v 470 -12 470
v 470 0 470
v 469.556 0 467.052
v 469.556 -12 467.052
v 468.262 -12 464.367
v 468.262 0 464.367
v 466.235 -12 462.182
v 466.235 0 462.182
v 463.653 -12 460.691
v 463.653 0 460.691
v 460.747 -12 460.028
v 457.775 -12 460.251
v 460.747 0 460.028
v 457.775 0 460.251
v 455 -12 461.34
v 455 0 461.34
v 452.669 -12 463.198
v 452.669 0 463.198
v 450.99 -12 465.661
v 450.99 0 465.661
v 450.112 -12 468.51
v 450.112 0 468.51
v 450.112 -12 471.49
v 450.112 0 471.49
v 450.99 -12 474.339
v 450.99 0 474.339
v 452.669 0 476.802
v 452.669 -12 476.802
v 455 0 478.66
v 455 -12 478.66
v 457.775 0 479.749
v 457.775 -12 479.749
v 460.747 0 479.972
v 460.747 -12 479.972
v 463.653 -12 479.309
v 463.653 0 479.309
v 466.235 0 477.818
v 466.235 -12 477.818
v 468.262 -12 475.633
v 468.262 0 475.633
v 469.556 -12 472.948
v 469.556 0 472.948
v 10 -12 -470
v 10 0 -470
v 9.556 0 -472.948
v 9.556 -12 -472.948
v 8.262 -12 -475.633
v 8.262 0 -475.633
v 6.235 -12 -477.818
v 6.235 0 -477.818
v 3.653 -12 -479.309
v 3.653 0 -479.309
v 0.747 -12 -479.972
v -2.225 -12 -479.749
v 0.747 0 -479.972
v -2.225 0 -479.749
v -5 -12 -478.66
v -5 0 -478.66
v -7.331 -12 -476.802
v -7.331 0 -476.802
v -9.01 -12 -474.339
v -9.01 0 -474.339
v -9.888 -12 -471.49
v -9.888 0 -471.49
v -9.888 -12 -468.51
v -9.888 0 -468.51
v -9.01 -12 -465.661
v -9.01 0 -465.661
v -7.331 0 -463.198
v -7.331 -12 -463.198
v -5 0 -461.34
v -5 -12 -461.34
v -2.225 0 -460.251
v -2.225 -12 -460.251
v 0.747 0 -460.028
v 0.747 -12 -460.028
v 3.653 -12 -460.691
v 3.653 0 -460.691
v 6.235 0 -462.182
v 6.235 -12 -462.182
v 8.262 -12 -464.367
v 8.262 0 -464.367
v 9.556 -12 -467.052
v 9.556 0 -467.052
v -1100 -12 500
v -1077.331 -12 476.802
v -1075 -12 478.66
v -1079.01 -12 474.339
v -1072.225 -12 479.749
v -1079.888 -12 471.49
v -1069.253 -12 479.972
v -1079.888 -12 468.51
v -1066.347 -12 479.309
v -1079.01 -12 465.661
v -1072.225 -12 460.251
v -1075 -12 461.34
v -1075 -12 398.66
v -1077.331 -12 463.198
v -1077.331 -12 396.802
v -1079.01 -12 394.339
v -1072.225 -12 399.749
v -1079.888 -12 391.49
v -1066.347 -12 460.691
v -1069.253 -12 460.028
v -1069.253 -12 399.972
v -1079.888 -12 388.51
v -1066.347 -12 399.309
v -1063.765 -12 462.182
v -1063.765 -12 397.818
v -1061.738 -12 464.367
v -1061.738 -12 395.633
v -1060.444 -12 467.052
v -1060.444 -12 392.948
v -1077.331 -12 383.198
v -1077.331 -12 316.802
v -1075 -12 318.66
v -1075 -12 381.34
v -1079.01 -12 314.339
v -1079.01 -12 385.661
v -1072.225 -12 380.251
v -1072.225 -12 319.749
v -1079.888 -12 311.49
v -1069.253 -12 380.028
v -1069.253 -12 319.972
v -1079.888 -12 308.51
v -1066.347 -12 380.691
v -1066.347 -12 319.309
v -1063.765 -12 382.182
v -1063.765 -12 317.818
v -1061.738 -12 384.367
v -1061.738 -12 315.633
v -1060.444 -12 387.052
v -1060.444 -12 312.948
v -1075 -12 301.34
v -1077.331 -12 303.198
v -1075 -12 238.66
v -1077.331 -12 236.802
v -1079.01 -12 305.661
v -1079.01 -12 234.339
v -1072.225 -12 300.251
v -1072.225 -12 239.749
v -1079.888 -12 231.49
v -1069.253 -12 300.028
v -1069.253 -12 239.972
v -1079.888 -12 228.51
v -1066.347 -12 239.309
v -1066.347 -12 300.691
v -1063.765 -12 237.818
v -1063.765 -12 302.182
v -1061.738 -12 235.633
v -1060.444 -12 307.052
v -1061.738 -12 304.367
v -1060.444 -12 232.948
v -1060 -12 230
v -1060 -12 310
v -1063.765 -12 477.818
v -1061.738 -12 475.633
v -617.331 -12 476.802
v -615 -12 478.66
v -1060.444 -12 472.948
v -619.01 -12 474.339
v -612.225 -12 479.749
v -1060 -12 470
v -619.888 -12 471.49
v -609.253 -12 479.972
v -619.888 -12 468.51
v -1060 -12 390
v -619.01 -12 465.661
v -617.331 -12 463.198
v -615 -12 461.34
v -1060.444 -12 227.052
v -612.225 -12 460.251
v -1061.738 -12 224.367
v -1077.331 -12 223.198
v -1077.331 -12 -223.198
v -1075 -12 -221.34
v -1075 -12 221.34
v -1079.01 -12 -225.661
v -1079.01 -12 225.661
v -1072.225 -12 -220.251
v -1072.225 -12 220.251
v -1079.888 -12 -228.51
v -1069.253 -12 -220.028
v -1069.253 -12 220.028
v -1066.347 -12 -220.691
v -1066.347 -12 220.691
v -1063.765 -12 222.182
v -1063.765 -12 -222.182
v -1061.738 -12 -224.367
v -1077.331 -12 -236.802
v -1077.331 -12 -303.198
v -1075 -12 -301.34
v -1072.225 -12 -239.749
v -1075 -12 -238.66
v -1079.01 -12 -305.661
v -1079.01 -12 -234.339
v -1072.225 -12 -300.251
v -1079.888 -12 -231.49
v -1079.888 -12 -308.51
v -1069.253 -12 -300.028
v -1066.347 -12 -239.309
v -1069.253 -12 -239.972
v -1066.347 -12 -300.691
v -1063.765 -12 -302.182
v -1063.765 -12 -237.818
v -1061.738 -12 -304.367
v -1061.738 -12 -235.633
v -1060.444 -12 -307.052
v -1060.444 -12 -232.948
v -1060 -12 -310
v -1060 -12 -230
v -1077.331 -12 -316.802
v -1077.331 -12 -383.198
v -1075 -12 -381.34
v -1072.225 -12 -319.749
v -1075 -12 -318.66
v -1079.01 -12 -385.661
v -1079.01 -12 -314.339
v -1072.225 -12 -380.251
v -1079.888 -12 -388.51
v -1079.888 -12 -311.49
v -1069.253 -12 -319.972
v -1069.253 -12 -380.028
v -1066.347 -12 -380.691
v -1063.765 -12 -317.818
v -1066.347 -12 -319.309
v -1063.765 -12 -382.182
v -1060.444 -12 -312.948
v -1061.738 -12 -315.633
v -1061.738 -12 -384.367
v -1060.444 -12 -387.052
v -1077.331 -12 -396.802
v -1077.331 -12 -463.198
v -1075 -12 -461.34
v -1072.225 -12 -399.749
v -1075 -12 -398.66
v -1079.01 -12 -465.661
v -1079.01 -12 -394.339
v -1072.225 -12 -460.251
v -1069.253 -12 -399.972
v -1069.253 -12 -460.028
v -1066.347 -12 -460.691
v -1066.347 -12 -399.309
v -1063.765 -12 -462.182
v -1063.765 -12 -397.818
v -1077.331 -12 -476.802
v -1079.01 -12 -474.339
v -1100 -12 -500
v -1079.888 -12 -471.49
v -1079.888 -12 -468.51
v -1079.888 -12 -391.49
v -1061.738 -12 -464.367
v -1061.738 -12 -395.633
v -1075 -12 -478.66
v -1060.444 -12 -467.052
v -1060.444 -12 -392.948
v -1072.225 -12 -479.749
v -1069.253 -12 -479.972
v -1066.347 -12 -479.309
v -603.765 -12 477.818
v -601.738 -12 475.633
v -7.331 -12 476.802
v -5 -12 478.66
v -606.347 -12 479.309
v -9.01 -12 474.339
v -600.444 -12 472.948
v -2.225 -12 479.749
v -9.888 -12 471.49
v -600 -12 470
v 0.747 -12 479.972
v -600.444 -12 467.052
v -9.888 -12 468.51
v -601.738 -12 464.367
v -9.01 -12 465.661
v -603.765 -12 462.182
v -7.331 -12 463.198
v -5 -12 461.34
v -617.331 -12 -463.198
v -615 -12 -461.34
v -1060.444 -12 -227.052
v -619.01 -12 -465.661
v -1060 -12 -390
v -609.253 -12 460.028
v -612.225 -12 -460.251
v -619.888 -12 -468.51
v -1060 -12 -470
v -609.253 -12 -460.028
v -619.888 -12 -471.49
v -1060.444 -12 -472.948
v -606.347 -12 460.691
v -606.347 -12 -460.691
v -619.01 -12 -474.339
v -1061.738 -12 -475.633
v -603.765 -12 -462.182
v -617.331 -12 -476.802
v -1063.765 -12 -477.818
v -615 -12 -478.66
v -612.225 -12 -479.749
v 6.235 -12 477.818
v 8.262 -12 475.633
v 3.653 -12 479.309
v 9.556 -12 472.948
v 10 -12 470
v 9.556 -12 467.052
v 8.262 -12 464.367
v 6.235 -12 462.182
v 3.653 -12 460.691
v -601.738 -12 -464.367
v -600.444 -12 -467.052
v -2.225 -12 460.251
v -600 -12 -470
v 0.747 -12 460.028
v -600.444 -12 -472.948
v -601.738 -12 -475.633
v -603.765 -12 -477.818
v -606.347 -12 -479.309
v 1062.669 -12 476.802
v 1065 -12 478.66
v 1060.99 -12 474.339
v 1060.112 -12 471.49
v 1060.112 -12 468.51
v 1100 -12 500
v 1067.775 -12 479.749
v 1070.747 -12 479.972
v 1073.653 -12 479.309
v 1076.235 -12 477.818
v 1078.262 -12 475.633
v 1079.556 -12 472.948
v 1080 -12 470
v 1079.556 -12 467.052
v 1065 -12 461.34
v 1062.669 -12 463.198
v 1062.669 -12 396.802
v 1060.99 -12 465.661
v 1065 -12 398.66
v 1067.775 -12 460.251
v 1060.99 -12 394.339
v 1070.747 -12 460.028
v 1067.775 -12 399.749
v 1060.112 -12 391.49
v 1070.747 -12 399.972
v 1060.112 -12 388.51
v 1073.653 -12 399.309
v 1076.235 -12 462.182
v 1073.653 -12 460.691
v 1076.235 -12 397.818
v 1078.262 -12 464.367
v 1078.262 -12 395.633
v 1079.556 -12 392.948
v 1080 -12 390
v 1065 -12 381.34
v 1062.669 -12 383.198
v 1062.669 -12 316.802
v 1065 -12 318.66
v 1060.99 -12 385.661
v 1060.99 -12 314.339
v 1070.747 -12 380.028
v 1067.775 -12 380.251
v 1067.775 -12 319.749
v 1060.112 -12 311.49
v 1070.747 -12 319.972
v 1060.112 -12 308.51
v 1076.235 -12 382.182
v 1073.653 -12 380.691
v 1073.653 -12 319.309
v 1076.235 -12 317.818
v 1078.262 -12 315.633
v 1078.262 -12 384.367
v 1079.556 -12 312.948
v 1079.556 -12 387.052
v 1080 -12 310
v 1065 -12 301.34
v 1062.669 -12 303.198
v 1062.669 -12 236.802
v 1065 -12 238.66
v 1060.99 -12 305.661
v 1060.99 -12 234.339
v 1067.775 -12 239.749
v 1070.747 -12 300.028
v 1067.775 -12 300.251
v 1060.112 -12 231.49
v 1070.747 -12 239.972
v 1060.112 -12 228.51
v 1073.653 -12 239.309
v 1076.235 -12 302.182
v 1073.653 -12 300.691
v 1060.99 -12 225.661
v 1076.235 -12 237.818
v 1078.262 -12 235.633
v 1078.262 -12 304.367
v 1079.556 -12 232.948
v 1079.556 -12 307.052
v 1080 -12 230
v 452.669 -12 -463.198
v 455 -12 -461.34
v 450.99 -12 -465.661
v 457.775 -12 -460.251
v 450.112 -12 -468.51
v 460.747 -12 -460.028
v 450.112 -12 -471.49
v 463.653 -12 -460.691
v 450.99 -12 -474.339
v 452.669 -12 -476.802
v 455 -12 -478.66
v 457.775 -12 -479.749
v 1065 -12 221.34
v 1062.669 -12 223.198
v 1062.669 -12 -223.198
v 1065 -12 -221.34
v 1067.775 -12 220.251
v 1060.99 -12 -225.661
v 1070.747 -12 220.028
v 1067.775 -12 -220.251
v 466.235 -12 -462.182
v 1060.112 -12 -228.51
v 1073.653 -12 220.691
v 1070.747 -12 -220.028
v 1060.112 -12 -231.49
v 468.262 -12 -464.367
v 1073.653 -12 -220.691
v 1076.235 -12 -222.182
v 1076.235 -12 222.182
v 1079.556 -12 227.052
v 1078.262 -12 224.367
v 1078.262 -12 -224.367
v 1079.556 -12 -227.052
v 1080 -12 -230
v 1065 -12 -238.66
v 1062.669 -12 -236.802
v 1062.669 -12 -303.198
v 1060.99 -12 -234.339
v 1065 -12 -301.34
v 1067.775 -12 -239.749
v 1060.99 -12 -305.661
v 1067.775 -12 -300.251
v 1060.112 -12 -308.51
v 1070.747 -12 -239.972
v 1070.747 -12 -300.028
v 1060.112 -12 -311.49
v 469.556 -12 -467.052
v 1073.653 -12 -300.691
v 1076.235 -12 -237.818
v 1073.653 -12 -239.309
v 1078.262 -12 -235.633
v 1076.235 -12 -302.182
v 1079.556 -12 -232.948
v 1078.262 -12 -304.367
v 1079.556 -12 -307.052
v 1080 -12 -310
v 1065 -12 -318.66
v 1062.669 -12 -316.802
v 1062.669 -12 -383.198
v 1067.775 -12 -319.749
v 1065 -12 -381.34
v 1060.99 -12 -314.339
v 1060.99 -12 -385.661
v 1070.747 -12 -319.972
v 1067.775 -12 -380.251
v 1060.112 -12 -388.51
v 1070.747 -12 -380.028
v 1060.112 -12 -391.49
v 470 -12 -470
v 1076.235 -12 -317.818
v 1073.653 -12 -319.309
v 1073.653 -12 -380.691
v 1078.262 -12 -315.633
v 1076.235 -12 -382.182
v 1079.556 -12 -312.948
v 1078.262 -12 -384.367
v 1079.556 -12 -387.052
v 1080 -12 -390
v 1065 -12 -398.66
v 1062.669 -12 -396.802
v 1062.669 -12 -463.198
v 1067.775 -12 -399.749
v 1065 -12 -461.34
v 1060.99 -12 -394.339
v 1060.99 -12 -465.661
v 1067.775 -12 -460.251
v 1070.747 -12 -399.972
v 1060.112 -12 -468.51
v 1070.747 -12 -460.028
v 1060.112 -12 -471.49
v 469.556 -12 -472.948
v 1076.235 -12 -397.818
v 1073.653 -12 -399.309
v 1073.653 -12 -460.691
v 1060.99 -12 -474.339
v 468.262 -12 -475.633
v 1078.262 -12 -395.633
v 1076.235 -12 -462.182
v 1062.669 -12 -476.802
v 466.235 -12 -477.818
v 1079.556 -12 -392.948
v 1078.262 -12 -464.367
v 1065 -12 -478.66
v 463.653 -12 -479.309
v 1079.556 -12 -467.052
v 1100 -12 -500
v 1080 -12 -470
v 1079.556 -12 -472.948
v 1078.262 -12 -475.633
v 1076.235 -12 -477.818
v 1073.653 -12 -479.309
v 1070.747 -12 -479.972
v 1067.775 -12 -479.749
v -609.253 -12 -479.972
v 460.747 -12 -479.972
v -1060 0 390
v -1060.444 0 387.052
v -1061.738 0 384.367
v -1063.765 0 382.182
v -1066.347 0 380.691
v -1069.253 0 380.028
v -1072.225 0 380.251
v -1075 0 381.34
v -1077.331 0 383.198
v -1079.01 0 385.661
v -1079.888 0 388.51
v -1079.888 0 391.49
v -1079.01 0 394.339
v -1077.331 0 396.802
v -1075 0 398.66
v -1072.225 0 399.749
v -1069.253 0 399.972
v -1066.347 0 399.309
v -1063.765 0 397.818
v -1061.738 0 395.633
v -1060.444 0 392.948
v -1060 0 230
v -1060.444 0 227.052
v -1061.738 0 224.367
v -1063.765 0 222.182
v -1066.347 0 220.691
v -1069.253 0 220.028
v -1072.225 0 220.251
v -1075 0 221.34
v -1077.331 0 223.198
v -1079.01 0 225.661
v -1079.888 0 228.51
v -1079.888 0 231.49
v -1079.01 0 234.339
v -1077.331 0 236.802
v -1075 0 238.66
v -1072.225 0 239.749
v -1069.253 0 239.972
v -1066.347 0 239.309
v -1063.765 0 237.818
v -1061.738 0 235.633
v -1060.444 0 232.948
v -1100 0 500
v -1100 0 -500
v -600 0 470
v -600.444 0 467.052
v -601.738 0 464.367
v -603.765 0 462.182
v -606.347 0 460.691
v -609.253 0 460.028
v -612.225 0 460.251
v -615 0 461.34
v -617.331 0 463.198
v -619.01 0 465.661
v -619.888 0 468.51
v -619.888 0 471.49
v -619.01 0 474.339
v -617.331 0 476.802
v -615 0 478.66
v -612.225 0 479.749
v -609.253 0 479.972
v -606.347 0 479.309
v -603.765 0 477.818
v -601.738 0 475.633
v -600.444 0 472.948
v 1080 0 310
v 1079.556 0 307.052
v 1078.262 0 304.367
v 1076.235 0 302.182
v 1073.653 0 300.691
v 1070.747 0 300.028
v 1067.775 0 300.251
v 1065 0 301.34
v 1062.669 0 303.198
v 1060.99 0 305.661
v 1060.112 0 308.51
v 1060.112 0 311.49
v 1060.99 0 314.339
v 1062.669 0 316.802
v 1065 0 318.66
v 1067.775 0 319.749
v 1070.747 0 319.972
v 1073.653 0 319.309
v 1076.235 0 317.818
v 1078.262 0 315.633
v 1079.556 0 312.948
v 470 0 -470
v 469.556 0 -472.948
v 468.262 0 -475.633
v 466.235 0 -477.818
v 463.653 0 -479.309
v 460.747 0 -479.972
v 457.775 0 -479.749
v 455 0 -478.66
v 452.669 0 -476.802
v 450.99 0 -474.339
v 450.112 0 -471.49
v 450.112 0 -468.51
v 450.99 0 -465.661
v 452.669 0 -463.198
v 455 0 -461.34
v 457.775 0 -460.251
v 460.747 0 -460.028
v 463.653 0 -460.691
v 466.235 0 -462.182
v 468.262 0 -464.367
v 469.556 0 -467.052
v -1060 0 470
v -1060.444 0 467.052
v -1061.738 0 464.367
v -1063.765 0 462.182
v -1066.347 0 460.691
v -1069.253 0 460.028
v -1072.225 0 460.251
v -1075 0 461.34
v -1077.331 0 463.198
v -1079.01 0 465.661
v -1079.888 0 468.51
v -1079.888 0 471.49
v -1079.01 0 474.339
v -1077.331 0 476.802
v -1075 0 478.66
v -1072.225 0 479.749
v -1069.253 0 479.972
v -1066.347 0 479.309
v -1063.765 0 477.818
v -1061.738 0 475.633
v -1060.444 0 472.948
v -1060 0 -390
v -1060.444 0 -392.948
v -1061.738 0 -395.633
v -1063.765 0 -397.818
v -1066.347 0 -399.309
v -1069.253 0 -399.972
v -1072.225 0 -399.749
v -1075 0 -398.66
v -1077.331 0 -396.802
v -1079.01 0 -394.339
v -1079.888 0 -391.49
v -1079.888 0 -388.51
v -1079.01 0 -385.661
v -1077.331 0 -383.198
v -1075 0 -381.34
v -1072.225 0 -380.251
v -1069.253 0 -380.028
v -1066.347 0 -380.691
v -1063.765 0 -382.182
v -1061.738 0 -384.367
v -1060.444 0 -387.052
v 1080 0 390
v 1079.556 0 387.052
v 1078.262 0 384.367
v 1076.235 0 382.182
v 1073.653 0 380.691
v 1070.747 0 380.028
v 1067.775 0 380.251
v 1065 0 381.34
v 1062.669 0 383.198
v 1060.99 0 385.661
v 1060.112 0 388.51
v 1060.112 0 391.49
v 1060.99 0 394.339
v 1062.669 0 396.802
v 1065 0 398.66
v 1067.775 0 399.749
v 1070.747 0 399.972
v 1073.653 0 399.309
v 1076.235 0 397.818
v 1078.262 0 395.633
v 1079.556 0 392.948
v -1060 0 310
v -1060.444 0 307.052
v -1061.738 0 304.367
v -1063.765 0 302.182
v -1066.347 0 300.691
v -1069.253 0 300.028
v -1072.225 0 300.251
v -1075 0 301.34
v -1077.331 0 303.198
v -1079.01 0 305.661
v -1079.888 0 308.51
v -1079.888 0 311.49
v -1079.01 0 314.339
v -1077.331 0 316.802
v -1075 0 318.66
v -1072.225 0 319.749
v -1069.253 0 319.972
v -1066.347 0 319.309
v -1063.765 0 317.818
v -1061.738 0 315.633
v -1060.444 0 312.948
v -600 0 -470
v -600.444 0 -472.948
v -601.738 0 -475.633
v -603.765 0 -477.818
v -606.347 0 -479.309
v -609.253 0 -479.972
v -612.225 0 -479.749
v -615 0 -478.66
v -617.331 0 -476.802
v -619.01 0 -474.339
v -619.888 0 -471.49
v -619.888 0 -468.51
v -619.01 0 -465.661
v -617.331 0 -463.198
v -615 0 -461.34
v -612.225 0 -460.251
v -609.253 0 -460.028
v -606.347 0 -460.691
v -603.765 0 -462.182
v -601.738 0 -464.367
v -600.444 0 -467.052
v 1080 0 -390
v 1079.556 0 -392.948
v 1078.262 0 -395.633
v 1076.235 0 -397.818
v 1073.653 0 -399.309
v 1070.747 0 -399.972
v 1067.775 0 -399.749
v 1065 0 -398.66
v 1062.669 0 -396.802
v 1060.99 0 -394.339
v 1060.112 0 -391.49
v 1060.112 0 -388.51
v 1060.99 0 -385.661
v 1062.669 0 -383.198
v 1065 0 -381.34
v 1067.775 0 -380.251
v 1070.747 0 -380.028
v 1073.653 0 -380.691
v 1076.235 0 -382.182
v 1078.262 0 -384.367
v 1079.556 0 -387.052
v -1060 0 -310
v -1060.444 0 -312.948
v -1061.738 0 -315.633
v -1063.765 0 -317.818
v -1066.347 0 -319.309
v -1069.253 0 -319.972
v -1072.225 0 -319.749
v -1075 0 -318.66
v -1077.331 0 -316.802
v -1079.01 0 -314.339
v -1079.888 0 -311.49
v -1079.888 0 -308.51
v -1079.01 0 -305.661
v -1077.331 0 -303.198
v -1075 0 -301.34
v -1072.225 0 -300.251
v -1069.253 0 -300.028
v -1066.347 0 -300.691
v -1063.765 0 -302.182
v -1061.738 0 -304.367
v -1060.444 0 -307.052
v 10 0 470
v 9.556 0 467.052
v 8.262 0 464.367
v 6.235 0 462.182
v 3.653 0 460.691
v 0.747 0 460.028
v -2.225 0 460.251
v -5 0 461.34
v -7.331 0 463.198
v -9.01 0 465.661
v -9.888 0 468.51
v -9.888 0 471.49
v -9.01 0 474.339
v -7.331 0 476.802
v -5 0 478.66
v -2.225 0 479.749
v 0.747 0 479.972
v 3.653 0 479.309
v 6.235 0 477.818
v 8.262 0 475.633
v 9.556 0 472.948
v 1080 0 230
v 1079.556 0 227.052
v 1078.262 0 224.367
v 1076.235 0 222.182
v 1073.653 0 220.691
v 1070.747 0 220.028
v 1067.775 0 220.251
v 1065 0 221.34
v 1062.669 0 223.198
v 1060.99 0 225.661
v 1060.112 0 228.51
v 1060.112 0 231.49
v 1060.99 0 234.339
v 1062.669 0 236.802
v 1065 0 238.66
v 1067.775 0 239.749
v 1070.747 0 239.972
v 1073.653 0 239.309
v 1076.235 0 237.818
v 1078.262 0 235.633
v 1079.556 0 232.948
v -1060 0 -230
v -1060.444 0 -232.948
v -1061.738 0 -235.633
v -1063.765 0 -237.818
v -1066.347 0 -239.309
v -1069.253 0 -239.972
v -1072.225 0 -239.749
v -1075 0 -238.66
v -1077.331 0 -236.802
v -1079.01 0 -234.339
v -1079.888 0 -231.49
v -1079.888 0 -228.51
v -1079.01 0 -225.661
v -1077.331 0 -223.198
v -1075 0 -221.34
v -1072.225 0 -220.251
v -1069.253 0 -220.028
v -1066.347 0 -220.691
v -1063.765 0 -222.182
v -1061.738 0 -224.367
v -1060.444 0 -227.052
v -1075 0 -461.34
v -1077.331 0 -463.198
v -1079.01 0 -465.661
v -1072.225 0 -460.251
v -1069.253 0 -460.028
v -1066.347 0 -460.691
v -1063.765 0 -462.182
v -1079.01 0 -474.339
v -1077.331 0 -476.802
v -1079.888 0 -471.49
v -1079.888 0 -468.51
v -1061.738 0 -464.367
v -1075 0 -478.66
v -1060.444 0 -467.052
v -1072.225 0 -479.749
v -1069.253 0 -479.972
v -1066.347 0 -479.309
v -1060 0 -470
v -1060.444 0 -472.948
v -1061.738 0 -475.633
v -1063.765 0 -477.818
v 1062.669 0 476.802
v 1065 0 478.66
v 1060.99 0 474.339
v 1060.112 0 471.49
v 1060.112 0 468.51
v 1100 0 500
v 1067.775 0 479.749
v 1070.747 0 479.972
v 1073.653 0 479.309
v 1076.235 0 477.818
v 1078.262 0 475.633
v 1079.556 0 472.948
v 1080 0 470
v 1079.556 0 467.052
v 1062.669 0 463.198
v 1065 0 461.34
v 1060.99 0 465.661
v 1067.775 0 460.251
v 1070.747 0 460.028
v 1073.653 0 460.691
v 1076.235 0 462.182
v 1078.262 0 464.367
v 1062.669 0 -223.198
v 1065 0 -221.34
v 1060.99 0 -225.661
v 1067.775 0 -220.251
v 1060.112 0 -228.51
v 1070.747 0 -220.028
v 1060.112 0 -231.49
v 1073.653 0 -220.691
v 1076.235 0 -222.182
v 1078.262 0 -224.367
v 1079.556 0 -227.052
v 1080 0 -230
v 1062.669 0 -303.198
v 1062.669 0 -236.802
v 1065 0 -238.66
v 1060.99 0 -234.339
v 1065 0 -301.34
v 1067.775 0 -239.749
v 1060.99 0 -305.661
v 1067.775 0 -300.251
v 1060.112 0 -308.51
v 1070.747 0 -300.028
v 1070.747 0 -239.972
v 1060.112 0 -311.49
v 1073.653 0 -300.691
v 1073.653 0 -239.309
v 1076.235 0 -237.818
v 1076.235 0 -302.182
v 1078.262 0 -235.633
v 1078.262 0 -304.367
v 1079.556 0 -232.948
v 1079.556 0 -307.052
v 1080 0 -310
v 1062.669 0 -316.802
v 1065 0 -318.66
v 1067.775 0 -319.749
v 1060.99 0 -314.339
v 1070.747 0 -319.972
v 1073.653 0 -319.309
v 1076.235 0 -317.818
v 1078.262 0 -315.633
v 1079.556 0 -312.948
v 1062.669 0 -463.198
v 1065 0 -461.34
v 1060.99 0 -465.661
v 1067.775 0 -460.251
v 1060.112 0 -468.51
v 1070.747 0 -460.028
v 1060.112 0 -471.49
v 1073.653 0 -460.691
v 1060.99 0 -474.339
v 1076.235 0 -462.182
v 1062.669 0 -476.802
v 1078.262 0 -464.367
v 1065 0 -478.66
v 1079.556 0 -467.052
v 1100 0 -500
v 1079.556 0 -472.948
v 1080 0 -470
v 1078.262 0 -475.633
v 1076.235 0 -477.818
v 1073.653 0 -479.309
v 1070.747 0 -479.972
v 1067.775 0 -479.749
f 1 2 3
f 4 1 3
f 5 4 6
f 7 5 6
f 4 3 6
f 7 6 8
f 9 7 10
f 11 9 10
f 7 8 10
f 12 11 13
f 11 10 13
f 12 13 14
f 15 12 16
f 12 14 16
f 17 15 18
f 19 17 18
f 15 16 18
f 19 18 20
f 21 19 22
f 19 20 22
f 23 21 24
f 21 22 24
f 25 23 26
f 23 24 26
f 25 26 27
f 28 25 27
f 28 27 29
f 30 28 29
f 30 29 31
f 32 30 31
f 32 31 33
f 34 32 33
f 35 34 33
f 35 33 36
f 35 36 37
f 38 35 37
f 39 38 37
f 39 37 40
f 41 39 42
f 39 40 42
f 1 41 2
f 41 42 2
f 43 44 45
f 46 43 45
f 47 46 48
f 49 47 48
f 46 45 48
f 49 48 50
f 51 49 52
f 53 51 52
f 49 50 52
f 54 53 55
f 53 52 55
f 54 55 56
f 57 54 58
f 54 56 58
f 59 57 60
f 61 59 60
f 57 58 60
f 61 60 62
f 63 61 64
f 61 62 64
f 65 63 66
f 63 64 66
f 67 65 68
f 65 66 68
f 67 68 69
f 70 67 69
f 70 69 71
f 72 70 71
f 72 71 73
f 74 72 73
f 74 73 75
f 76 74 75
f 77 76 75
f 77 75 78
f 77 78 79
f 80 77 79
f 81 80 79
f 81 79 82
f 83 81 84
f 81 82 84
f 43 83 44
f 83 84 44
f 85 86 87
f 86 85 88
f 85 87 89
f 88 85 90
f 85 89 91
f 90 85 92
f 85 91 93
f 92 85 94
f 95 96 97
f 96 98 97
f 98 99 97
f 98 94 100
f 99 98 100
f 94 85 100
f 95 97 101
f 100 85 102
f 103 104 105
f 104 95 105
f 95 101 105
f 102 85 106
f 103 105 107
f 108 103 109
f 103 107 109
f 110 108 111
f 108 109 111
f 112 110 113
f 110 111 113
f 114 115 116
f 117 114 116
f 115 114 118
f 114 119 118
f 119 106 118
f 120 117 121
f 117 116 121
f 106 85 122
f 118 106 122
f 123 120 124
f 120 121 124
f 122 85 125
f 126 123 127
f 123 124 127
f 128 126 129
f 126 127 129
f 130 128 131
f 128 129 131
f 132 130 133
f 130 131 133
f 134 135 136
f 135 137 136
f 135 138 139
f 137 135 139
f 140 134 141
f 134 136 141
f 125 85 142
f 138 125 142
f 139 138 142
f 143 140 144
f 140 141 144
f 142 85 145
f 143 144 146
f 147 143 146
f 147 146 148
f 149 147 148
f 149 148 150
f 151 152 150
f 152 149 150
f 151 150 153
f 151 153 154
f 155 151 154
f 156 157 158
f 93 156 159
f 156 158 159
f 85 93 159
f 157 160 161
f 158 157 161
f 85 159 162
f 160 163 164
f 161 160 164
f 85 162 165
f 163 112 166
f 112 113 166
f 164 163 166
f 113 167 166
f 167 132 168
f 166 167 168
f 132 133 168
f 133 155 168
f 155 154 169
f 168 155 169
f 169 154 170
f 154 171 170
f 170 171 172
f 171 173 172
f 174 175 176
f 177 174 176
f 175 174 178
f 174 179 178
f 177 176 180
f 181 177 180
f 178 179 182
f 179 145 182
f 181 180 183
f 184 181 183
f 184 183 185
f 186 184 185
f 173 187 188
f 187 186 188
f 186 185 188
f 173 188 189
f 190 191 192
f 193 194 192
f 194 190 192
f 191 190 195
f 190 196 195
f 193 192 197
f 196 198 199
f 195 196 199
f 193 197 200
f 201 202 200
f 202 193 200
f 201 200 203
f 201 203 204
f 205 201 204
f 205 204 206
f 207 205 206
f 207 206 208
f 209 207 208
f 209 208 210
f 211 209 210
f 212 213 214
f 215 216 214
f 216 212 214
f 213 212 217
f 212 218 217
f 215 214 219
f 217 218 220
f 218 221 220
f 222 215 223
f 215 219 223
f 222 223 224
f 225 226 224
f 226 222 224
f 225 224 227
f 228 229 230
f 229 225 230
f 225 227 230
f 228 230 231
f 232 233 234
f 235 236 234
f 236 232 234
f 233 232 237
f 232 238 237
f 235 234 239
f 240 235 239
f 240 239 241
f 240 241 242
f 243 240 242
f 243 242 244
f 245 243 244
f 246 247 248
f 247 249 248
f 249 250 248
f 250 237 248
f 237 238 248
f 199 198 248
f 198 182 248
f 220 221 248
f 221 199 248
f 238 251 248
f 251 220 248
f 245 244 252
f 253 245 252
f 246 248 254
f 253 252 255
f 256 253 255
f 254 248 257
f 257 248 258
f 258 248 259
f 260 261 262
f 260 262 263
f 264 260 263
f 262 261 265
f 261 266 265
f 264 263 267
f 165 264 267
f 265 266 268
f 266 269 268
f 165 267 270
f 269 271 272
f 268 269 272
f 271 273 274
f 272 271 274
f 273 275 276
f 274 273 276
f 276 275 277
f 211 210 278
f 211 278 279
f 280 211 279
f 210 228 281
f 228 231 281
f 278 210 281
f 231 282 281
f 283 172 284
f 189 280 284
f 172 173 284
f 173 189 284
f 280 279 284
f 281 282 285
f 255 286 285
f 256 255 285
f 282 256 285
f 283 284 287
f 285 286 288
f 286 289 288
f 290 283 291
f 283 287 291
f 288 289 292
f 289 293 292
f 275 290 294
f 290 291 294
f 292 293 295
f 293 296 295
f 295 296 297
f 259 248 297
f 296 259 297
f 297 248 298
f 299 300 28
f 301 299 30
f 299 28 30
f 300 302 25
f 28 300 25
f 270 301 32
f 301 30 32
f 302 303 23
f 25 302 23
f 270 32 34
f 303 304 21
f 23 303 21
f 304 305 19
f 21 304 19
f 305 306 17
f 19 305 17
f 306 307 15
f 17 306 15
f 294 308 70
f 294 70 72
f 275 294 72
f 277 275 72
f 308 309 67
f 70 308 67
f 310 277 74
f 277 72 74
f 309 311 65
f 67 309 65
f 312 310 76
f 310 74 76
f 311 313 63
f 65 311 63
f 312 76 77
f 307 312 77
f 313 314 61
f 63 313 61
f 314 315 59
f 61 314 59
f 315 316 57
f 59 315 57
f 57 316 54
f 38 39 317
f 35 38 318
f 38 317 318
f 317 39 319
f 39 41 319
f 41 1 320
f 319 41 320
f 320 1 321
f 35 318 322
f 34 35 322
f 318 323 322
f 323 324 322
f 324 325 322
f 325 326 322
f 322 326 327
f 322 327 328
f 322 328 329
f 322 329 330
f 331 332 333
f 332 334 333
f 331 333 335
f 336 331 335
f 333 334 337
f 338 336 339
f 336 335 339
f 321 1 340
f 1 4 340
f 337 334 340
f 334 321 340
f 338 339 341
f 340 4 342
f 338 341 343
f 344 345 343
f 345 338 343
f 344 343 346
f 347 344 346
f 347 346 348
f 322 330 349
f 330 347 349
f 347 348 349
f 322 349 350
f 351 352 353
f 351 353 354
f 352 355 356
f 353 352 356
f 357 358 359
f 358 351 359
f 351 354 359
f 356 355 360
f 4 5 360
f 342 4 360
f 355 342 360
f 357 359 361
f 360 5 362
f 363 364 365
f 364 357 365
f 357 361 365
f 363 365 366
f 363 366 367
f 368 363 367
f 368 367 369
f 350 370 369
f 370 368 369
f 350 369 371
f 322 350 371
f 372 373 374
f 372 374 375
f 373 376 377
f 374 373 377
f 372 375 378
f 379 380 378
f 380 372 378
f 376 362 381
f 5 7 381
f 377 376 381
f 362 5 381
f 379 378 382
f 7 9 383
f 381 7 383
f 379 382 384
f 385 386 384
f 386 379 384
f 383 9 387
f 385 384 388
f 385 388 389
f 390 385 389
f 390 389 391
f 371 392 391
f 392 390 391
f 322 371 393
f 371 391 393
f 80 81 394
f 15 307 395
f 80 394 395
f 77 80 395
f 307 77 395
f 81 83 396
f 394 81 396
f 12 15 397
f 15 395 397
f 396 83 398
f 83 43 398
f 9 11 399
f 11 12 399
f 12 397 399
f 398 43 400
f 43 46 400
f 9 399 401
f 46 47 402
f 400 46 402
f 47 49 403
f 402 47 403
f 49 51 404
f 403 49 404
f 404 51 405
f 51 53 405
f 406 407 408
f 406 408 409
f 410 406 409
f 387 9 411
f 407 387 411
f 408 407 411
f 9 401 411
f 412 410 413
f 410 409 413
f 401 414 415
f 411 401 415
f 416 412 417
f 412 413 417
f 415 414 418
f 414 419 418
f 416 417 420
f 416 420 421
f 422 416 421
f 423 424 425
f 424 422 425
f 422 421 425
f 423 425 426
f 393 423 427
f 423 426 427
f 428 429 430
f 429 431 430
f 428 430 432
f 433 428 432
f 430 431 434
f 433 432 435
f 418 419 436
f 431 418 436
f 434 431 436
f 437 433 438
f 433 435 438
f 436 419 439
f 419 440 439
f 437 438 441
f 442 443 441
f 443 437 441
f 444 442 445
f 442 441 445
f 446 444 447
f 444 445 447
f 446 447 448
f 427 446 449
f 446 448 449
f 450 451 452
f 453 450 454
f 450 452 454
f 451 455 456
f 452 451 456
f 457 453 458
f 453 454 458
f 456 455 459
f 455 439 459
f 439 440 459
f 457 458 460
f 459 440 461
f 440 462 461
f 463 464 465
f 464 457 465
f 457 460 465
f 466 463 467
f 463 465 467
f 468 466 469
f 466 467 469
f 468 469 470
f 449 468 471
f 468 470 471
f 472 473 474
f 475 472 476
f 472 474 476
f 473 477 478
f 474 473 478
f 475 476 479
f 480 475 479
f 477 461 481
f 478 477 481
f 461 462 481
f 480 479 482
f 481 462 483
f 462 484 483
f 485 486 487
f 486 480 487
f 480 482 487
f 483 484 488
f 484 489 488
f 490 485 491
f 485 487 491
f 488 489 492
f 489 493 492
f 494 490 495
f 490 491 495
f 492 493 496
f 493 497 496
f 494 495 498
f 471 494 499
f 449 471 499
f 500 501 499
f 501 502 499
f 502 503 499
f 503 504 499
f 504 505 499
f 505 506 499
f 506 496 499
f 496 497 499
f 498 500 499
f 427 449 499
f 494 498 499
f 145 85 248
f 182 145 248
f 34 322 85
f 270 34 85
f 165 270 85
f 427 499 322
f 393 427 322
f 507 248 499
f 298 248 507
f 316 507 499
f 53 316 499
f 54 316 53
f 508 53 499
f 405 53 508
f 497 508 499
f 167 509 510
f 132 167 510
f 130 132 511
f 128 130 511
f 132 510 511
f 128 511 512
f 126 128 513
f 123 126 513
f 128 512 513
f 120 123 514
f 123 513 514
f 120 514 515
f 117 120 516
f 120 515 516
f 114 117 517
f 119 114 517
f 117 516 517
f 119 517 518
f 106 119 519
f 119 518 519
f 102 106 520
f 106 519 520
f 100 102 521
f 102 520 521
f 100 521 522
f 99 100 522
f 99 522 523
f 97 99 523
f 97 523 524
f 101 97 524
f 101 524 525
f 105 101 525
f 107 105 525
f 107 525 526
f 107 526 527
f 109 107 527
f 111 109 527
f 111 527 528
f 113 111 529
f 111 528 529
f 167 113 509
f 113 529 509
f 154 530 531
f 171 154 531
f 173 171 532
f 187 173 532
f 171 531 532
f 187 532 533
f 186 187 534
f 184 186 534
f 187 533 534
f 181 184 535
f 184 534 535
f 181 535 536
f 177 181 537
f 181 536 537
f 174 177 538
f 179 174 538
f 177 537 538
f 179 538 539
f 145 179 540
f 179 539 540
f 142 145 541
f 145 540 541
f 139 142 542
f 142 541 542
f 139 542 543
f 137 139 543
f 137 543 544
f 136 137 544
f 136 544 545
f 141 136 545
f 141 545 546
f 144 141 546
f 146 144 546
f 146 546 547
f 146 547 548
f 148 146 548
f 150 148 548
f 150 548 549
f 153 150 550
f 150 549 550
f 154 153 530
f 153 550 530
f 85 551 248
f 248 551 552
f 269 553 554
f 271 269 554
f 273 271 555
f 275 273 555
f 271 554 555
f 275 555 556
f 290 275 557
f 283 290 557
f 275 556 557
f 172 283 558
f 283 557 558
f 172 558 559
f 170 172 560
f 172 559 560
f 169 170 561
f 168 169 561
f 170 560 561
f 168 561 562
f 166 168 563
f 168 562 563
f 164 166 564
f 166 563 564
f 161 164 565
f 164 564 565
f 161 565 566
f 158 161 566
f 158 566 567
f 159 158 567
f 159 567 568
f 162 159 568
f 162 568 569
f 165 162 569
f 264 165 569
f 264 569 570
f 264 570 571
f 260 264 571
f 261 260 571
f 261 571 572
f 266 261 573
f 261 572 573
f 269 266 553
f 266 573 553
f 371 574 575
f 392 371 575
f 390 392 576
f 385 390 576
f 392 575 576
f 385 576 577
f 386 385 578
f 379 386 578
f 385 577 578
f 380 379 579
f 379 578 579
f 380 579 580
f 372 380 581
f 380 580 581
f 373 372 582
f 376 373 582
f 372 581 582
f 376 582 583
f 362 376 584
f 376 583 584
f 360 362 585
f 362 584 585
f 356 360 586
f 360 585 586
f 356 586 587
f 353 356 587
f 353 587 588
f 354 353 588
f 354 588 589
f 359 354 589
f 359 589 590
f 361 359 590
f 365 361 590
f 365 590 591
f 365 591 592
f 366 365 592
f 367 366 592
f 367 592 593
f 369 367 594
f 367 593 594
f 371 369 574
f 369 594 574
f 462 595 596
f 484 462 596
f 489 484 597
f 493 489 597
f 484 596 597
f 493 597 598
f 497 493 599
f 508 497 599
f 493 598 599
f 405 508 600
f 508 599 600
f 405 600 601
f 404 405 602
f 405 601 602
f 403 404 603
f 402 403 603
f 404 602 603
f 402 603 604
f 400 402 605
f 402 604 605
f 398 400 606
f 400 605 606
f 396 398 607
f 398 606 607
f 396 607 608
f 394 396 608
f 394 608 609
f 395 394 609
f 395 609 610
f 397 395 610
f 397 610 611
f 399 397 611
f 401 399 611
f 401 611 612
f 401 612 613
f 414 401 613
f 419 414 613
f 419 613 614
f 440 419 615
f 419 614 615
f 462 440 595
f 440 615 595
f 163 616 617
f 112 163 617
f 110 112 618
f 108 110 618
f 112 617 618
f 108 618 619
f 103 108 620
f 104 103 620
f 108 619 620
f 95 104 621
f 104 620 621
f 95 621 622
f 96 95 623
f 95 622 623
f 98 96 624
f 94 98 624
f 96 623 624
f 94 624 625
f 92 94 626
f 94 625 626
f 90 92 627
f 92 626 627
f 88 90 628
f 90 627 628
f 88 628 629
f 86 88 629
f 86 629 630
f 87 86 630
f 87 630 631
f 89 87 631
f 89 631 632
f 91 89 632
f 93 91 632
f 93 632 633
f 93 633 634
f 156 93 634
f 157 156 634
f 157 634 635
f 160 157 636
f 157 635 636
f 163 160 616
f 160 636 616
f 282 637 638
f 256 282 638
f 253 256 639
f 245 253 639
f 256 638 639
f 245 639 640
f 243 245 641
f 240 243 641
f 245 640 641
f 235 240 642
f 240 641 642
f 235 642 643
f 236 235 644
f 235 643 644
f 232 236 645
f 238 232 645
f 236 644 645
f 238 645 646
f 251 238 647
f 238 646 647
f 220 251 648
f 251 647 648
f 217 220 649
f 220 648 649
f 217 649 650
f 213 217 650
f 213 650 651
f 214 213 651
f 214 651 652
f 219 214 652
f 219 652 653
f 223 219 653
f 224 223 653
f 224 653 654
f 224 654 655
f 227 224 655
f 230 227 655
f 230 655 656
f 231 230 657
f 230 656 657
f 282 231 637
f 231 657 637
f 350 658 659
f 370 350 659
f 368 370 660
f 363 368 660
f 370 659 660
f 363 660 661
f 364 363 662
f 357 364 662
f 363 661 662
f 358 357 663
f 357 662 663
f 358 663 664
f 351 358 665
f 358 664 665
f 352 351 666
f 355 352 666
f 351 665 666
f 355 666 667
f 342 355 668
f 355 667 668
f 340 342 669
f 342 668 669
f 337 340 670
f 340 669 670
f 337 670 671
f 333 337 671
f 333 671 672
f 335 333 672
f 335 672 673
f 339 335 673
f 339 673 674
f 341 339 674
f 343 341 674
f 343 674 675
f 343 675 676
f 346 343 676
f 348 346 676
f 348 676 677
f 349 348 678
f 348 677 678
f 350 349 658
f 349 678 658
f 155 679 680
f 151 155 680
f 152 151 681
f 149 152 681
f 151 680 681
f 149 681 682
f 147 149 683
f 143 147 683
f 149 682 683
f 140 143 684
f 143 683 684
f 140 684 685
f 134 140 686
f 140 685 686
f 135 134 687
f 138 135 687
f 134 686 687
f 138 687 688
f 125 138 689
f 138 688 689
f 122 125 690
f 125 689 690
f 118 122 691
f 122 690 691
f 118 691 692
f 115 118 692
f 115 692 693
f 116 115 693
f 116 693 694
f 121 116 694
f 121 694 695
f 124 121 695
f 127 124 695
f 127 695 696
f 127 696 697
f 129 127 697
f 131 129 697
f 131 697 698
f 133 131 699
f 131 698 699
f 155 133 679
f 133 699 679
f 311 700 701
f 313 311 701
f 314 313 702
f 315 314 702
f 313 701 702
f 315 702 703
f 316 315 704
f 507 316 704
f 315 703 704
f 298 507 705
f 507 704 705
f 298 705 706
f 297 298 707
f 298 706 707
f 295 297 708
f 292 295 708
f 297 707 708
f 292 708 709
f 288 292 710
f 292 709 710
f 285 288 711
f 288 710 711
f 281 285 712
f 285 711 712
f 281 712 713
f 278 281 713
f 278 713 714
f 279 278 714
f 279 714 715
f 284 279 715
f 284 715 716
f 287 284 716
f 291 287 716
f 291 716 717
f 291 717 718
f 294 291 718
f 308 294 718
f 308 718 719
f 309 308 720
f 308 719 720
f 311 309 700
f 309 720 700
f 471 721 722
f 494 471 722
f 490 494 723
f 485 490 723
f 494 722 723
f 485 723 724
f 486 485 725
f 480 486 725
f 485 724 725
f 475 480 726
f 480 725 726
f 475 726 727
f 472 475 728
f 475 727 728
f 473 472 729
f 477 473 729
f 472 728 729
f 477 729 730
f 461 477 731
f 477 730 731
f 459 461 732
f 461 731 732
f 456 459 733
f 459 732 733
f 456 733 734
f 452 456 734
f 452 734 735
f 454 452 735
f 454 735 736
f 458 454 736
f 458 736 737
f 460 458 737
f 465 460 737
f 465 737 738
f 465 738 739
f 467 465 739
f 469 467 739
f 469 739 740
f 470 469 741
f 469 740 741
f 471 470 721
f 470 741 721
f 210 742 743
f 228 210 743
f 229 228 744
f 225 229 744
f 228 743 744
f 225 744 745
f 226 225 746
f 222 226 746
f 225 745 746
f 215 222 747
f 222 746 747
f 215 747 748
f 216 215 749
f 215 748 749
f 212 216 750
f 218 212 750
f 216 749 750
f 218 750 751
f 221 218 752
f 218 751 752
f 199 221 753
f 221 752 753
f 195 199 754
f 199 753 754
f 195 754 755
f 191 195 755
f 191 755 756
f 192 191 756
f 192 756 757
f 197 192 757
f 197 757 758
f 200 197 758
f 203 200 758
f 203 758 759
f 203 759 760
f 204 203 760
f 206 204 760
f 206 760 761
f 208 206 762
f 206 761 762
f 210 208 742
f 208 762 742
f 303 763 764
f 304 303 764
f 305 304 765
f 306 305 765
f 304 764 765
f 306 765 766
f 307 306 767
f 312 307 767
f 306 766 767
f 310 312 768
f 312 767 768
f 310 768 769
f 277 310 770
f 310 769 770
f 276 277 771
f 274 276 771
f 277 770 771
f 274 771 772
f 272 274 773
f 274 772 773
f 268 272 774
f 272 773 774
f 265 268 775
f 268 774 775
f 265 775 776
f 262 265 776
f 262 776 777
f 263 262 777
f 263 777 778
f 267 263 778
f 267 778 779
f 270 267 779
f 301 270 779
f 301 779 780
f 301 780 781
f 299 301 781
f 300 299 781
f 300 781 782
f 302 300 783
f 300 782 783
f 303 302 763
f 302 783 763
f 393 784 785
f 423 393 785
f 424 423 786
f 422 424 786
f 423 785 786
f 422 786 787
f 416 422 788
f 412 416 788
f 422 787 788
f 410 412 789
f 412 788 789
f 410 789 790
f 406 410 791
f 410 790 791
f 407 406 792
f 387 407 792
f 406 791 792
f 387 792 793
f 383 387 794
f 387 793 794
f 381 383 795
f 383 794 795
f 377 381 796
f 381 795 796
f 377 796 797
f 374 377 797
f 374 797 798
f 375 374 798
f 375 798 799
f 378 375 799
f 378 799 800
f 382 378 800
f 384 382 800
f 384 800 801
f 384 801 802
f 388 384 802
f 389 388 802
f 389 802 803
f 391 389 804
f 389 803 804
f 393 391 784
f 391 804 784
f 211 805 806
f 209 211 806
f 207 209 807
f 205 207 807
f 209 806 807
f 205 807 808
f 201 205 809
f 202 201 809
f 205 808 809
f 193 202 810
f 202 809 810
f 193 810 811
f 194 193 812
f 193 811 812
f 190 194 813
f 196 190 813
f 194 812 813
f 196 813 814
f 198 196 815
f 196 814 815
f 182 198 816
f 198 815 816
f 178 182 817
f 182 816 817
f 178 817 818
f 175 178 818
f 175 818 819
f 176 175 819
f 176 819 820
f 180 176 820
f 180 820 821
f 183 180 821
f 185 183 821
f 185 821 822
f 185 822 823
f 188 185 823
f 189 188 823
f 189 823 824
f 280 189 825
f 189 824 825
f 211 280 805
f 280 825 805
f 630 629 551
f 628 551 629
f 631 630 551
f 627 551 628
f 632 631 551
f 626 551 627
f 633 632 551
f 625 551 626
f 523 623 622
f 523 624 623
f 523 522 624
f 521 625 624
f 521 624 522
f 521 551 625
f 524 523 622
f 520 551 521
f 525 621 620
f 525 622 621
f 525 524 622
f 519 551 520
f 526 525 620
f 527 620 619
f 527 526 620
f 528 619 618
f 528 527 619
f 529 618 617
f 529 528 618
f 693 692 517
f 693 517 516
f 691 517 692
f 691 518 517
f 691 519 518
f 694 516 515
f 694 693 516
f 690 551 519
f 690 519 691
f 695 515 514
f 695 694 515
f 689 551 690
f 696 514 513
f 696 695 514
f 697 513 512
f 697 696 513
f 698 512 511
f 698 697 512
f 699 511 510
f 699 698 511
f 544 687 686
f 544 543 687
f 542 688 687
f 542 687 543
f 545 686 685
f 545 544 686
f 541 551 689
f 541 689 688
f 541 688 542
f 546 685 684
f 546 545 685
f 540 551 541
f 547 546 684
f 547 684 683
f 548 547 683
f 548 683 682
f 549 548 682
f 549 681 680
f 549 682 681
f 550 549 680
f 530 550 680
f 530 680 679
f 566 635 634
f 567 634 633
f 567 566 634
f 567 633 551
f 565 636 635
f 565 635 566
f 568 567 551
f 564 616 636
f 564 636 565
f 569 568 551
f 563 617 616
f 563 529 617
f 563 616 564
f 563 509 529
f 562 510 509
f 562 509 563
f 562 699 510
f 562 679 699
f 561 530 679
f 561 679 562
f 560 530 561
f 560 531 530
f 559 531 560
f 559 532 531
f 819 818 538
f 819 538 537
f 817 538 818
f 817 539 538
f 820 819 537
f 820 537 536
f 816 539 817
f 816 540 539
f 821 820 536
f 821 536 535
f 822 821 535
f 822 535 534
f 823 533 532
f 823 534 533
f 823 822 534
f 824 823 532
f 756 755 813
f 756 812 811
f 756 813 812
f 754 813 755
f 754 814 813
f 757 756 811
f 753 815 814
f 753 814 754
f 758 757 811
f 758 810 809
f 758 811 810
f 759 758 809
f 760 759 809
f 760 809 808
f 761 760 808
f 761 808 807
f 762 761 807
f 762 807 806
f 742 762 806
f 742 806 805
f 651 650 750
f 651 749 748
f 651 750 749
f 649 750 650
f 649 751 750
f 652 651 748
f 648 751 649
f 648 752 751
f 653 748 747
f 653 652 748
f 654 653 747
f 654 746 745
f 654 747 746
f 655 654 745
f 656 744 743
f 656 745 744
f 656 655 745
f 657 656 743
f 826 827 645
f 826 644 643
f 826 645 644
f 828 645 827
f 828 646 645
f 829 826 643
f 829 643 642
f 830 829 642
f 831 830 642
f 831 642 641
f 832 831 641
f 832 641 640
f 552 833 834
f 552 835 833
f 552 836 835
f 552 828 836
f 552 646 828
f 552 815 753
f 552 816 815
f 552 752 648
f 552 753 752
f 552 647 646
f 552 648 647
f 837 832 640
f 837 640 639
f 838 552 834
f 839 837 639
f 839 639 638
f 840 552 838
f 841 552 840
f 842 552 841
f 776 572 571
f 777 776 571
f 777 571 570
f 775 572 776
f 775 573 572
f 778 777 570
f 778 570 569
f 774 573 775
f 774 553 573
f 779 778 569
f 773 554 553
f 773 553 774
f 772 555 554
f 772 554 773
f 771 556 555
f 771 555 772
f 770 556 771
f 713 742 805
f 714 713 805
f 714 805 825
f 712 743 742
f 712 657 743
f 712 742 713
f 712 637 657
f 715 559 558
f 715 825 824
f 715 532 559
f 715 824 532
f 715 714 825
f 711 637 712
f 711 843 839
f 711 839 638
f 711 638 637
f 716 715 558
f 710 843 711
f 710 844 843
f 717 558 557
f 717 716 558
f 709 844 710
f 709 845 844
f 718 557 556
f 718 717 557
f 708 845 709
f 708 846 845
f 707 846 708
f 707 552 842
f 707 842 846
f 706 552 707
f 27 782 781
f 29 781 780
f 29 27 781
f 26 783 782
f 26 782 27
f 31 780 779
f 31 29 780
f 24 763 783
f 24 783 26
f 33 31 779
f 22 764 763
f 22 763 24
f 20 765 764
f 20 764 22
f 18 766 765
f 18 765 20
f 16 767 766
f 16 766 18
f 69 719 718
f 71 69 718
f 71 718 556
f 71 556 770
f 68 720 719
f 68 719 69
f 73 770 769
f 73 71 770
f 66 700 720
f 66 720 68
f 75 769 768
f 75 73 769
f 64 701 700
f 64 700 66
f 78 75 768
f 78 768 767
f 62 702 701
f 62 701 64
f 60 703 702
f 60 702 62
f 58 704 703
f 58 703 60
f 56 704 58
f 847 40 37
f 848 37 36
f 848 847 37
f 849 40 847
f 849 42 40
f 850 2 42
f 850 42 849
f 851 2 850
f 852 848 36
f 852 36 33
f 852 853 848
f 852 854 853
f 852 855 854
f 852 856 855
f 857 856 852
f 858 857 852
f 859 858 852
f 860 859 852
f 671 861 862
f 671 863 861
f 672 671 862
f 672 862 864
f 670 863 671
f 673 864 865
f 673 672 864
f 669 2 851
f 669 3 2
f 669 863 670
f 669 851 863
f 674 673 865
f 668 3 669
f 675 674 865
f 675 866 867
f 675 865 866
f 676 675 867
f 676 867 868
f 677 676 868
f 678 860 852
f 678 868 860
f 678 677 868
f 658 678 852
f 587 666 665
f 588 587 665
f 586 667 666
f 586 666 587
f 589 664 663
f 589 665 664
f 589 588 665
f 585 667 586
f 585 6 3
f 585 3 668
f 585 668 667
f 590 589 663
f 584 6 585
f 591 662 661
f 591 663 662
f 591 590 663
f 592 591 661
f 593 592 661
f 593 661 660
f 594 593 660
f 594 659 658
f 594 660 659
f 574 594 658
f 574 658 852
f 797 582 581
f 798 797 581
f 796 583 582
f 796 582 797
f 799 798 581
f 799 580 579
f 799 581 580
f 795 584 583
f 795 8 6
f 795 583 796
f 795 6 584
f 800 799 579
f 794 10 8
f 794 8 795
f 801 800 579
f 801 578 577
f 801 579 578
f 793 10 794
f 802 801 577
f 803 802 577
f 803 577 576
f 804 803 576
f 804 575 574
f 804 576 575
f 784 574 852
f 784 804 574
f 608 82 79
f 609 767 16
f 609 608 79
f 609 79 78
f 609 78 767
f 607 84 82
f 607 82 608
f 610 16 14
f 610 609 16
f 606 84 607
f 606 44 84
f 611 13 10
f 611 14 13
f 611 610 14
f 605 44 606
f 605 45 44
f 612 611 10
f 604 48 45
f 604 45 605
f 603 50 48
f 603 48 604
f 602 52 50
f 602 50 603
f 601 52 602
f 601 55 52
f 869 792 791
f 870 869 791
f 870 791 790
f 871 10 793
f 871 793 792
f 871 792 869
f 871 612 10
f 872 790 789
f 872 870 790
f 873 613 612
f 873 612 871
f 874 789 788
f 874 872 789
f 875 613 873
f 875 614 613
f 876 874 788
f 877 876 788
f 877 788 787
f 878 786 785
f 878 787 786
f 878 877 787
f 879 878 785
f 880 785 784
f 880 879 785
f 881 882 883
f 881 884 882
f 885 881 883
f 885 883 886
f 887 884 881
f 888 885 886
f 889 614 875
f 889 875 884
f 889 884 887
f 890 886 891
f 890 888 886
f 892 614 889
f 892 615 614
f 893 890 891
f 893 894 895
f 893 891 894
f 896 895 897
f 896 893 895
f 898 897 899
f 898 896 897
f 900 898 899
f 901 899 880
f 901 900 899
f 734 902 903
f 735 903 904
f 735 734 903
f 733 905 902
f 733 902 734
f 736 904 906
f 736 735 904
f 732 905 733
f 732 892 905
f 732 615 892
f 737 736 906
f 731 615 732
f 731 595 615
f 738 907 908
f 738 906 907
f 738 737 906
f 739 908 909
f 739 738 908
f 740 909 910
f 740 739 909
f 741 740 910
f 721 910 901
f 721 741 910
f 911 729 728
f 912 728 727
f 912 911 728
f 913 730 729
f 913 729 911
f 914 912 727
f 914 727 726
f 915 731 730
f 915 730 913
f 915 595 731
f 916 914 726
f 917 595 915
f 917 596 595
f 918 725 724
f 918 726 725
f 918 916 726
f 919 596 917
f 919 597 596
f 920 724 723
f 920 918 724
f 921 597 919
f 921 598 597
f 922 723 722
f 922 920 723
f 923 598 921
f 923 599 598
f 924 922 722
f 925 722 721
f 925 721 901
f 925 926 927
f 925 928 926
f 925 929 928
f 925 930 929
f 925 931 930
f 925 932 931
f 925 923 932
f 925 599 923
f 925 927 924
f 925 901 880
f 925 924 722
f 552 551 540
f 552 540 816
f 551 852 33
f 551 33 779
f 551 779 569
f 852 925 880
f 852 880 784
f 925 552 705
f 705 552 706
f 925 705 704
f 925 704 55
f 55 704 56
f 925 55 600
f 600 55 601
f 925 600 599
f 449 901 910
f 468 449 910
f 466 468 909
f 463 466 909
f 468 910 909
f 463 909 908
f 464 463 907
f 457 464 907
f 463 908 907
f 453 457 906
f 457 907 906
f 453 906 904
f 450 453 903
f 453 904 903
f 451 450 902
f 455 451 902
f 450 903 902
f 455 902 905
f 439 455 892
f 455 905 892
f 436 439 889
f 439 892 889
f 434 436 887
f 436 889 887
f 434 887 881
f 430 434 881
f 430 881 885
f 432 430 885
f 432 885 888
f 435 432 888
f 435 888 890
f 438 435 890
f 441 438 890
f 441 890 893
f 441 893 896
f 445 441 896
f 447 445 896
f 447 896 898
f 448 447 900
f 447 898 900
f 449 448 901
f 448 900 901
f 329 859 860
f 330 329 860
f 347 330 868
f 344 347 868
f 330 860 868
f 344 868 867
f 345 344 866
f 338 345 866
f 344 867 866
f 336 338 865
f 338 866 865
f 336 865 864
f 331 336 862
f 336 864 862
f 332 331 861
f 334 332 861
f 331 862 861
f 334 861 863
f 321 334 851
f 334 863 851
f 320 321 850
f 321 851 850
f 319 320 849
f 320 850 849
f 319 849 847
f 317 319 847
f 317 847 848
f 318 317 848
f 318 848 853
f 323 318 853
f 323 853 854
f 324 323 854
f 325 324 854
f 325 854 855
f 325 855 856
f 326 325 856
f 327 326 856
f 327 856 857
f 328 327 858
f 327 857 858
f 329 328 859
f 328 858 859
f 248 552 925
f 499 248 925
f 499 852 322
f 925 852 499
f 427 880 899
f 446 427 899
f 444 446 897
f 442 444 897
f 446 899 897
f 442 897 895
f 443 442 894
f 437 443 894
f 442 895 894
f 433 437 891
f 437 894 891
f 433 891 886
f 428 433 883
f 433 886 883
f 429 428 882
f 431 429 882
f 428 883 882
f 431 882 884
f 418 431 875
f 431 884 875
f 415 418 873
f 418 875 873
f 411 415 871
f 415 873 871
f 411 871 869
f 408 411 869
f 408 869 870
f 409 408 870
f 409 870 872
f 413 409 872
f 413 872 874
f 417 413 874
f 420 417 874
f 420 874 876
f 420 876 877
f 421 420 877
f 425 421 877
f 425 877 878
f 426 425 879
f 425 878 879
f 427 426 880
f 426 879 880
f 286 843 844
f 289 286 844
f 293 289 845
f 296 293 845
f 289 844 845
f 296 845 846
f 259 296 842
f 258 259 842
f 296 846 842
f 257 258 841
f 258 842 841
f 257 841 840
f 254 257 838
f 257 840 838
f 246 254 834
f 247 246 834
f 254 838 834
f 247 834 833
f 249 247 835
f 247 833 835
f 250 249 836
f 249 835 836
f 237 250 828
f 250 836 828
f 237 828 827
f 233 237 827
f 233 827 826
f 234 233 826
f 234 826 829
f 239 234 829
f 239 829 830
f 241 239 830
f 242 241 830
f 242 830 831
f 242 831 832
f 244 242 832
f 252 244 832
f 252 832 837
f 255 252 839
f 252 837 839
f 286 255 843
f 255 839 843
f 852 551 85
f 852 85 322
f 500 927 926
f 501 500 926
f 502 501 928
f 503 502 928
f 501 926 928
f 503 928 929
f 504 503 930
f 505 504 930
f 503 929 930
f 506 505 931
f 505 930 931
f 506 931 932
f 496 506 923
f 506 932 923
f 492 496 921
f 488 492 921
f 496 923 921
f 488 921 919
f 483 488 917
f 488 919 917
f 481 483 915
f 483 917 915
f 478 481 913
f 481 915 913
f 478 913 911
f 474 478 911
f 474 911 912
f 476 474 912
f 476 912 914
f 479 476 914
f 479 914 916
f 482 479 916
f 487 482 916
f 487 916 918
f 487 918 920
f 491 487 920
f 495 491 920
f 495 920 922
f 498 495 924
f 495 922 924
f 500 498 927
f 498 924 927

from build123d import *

# Parameters (mm, degrees)
SKETCH1_W           = 2200
SKETCH1_H           = 1000
SKETCH1_R           = 10
BOSS_EXTRUDE1_DEPTH = 12


with BuildPart() as part:
    # Sketch1 → Boss-Extrude1 (new body)
    with BuildSketch(Plane(origin=(0, 0, 0), x_dir=(1, 0, 0), z_dir=(0, 1, 0))):
        Rectangle(SKETCH1_W, SKETCH1_H)
        with Locations((-1070, 470)):
            Circle(SKETCH1_R, mode=Mode.SUBTRACT)
        with Locations((1070, 470)):
            Circle(SKETCH1_R, mode=Mode.SUBTRACT)
        with Locations((1070, 230)):
            Circle(SKETCH1_R, mode=Mode.SUBTRACT)
        with Locations((1070, 310)):
            Circle(SKETCH1_R, mode=Mode.SUBTRACT)
        with Locations((1070, 390)):
            Circle(SKETCH1_R, mode=Mode.SUBTRACT)
        with Locations((460, 470)):
            Circle(SKETCH1_R, mode=Mode.SUBTRACT)
        with Locations((0, 470)):
            Circle(SKETCH1_R, mode=Mode.SUBTRACT)
        with Locations((-610, 470)):
            Circle(SKETCH1_R, mode=Mode.SUBTRACT)
        with Locations((-1070, 390)):
            Circle(SKETCH1_R, mode=Mode.SUBTRACT)
        with Locations((-1070, 230)):
            Circle(SKETCH1_R, mode=Mode.SUBTRACT)
        with Locations((-1070, 310)):
            Circle(SKETCH1_R, mode=Mode.SUBTRACT)
        with Locations((1070, -230)):
            Circle(SKETCH1_R, mode=Mode.SUBTRACT)
        with Locations((1070, -310)):
            Circle(SKETCH1_R, mode=Mode.SUBTRACT)
        with Locations((1070, -390)):
            Circle(SKETCH1_R, mode=Mode.SUBTRACT)
        with Locations((1070, -470)):
            Circle(SKETCH1_R, mode=Mode.SUBTRACT)
        with Locations((460, -470)):
            Circle(SKETCH1_R, mode=Mode.SUBTRACT)
        with Locations((0, -470)):
            Circle(SKETCH1_R, mode=Mode.SUBTRACT)
        with Locations((-610, -470)):
            Circle(SKETCH1_R, mode=Mode.SUBTRACT)
        with Locations((-1070, -470)):
            Circle(SKETCH1_R, mode=Mode.SUBTRACT)
        with Locations((-1070, -390)):
            Circle(SKETCH1_R, mode=Mode.SUBTRACT)
        with Locations((-1070, -310)):
            Circle(SKETCH1_R, mode=Mode.SUBTRACT)
        with Locations((-1070, -230)):
            Circle(SKETCH1_R, mode=Mode.SUBTRACT)
    extrude(amount=-BOSS_EXTRUDE1_DEPTH)


solid = part.part
